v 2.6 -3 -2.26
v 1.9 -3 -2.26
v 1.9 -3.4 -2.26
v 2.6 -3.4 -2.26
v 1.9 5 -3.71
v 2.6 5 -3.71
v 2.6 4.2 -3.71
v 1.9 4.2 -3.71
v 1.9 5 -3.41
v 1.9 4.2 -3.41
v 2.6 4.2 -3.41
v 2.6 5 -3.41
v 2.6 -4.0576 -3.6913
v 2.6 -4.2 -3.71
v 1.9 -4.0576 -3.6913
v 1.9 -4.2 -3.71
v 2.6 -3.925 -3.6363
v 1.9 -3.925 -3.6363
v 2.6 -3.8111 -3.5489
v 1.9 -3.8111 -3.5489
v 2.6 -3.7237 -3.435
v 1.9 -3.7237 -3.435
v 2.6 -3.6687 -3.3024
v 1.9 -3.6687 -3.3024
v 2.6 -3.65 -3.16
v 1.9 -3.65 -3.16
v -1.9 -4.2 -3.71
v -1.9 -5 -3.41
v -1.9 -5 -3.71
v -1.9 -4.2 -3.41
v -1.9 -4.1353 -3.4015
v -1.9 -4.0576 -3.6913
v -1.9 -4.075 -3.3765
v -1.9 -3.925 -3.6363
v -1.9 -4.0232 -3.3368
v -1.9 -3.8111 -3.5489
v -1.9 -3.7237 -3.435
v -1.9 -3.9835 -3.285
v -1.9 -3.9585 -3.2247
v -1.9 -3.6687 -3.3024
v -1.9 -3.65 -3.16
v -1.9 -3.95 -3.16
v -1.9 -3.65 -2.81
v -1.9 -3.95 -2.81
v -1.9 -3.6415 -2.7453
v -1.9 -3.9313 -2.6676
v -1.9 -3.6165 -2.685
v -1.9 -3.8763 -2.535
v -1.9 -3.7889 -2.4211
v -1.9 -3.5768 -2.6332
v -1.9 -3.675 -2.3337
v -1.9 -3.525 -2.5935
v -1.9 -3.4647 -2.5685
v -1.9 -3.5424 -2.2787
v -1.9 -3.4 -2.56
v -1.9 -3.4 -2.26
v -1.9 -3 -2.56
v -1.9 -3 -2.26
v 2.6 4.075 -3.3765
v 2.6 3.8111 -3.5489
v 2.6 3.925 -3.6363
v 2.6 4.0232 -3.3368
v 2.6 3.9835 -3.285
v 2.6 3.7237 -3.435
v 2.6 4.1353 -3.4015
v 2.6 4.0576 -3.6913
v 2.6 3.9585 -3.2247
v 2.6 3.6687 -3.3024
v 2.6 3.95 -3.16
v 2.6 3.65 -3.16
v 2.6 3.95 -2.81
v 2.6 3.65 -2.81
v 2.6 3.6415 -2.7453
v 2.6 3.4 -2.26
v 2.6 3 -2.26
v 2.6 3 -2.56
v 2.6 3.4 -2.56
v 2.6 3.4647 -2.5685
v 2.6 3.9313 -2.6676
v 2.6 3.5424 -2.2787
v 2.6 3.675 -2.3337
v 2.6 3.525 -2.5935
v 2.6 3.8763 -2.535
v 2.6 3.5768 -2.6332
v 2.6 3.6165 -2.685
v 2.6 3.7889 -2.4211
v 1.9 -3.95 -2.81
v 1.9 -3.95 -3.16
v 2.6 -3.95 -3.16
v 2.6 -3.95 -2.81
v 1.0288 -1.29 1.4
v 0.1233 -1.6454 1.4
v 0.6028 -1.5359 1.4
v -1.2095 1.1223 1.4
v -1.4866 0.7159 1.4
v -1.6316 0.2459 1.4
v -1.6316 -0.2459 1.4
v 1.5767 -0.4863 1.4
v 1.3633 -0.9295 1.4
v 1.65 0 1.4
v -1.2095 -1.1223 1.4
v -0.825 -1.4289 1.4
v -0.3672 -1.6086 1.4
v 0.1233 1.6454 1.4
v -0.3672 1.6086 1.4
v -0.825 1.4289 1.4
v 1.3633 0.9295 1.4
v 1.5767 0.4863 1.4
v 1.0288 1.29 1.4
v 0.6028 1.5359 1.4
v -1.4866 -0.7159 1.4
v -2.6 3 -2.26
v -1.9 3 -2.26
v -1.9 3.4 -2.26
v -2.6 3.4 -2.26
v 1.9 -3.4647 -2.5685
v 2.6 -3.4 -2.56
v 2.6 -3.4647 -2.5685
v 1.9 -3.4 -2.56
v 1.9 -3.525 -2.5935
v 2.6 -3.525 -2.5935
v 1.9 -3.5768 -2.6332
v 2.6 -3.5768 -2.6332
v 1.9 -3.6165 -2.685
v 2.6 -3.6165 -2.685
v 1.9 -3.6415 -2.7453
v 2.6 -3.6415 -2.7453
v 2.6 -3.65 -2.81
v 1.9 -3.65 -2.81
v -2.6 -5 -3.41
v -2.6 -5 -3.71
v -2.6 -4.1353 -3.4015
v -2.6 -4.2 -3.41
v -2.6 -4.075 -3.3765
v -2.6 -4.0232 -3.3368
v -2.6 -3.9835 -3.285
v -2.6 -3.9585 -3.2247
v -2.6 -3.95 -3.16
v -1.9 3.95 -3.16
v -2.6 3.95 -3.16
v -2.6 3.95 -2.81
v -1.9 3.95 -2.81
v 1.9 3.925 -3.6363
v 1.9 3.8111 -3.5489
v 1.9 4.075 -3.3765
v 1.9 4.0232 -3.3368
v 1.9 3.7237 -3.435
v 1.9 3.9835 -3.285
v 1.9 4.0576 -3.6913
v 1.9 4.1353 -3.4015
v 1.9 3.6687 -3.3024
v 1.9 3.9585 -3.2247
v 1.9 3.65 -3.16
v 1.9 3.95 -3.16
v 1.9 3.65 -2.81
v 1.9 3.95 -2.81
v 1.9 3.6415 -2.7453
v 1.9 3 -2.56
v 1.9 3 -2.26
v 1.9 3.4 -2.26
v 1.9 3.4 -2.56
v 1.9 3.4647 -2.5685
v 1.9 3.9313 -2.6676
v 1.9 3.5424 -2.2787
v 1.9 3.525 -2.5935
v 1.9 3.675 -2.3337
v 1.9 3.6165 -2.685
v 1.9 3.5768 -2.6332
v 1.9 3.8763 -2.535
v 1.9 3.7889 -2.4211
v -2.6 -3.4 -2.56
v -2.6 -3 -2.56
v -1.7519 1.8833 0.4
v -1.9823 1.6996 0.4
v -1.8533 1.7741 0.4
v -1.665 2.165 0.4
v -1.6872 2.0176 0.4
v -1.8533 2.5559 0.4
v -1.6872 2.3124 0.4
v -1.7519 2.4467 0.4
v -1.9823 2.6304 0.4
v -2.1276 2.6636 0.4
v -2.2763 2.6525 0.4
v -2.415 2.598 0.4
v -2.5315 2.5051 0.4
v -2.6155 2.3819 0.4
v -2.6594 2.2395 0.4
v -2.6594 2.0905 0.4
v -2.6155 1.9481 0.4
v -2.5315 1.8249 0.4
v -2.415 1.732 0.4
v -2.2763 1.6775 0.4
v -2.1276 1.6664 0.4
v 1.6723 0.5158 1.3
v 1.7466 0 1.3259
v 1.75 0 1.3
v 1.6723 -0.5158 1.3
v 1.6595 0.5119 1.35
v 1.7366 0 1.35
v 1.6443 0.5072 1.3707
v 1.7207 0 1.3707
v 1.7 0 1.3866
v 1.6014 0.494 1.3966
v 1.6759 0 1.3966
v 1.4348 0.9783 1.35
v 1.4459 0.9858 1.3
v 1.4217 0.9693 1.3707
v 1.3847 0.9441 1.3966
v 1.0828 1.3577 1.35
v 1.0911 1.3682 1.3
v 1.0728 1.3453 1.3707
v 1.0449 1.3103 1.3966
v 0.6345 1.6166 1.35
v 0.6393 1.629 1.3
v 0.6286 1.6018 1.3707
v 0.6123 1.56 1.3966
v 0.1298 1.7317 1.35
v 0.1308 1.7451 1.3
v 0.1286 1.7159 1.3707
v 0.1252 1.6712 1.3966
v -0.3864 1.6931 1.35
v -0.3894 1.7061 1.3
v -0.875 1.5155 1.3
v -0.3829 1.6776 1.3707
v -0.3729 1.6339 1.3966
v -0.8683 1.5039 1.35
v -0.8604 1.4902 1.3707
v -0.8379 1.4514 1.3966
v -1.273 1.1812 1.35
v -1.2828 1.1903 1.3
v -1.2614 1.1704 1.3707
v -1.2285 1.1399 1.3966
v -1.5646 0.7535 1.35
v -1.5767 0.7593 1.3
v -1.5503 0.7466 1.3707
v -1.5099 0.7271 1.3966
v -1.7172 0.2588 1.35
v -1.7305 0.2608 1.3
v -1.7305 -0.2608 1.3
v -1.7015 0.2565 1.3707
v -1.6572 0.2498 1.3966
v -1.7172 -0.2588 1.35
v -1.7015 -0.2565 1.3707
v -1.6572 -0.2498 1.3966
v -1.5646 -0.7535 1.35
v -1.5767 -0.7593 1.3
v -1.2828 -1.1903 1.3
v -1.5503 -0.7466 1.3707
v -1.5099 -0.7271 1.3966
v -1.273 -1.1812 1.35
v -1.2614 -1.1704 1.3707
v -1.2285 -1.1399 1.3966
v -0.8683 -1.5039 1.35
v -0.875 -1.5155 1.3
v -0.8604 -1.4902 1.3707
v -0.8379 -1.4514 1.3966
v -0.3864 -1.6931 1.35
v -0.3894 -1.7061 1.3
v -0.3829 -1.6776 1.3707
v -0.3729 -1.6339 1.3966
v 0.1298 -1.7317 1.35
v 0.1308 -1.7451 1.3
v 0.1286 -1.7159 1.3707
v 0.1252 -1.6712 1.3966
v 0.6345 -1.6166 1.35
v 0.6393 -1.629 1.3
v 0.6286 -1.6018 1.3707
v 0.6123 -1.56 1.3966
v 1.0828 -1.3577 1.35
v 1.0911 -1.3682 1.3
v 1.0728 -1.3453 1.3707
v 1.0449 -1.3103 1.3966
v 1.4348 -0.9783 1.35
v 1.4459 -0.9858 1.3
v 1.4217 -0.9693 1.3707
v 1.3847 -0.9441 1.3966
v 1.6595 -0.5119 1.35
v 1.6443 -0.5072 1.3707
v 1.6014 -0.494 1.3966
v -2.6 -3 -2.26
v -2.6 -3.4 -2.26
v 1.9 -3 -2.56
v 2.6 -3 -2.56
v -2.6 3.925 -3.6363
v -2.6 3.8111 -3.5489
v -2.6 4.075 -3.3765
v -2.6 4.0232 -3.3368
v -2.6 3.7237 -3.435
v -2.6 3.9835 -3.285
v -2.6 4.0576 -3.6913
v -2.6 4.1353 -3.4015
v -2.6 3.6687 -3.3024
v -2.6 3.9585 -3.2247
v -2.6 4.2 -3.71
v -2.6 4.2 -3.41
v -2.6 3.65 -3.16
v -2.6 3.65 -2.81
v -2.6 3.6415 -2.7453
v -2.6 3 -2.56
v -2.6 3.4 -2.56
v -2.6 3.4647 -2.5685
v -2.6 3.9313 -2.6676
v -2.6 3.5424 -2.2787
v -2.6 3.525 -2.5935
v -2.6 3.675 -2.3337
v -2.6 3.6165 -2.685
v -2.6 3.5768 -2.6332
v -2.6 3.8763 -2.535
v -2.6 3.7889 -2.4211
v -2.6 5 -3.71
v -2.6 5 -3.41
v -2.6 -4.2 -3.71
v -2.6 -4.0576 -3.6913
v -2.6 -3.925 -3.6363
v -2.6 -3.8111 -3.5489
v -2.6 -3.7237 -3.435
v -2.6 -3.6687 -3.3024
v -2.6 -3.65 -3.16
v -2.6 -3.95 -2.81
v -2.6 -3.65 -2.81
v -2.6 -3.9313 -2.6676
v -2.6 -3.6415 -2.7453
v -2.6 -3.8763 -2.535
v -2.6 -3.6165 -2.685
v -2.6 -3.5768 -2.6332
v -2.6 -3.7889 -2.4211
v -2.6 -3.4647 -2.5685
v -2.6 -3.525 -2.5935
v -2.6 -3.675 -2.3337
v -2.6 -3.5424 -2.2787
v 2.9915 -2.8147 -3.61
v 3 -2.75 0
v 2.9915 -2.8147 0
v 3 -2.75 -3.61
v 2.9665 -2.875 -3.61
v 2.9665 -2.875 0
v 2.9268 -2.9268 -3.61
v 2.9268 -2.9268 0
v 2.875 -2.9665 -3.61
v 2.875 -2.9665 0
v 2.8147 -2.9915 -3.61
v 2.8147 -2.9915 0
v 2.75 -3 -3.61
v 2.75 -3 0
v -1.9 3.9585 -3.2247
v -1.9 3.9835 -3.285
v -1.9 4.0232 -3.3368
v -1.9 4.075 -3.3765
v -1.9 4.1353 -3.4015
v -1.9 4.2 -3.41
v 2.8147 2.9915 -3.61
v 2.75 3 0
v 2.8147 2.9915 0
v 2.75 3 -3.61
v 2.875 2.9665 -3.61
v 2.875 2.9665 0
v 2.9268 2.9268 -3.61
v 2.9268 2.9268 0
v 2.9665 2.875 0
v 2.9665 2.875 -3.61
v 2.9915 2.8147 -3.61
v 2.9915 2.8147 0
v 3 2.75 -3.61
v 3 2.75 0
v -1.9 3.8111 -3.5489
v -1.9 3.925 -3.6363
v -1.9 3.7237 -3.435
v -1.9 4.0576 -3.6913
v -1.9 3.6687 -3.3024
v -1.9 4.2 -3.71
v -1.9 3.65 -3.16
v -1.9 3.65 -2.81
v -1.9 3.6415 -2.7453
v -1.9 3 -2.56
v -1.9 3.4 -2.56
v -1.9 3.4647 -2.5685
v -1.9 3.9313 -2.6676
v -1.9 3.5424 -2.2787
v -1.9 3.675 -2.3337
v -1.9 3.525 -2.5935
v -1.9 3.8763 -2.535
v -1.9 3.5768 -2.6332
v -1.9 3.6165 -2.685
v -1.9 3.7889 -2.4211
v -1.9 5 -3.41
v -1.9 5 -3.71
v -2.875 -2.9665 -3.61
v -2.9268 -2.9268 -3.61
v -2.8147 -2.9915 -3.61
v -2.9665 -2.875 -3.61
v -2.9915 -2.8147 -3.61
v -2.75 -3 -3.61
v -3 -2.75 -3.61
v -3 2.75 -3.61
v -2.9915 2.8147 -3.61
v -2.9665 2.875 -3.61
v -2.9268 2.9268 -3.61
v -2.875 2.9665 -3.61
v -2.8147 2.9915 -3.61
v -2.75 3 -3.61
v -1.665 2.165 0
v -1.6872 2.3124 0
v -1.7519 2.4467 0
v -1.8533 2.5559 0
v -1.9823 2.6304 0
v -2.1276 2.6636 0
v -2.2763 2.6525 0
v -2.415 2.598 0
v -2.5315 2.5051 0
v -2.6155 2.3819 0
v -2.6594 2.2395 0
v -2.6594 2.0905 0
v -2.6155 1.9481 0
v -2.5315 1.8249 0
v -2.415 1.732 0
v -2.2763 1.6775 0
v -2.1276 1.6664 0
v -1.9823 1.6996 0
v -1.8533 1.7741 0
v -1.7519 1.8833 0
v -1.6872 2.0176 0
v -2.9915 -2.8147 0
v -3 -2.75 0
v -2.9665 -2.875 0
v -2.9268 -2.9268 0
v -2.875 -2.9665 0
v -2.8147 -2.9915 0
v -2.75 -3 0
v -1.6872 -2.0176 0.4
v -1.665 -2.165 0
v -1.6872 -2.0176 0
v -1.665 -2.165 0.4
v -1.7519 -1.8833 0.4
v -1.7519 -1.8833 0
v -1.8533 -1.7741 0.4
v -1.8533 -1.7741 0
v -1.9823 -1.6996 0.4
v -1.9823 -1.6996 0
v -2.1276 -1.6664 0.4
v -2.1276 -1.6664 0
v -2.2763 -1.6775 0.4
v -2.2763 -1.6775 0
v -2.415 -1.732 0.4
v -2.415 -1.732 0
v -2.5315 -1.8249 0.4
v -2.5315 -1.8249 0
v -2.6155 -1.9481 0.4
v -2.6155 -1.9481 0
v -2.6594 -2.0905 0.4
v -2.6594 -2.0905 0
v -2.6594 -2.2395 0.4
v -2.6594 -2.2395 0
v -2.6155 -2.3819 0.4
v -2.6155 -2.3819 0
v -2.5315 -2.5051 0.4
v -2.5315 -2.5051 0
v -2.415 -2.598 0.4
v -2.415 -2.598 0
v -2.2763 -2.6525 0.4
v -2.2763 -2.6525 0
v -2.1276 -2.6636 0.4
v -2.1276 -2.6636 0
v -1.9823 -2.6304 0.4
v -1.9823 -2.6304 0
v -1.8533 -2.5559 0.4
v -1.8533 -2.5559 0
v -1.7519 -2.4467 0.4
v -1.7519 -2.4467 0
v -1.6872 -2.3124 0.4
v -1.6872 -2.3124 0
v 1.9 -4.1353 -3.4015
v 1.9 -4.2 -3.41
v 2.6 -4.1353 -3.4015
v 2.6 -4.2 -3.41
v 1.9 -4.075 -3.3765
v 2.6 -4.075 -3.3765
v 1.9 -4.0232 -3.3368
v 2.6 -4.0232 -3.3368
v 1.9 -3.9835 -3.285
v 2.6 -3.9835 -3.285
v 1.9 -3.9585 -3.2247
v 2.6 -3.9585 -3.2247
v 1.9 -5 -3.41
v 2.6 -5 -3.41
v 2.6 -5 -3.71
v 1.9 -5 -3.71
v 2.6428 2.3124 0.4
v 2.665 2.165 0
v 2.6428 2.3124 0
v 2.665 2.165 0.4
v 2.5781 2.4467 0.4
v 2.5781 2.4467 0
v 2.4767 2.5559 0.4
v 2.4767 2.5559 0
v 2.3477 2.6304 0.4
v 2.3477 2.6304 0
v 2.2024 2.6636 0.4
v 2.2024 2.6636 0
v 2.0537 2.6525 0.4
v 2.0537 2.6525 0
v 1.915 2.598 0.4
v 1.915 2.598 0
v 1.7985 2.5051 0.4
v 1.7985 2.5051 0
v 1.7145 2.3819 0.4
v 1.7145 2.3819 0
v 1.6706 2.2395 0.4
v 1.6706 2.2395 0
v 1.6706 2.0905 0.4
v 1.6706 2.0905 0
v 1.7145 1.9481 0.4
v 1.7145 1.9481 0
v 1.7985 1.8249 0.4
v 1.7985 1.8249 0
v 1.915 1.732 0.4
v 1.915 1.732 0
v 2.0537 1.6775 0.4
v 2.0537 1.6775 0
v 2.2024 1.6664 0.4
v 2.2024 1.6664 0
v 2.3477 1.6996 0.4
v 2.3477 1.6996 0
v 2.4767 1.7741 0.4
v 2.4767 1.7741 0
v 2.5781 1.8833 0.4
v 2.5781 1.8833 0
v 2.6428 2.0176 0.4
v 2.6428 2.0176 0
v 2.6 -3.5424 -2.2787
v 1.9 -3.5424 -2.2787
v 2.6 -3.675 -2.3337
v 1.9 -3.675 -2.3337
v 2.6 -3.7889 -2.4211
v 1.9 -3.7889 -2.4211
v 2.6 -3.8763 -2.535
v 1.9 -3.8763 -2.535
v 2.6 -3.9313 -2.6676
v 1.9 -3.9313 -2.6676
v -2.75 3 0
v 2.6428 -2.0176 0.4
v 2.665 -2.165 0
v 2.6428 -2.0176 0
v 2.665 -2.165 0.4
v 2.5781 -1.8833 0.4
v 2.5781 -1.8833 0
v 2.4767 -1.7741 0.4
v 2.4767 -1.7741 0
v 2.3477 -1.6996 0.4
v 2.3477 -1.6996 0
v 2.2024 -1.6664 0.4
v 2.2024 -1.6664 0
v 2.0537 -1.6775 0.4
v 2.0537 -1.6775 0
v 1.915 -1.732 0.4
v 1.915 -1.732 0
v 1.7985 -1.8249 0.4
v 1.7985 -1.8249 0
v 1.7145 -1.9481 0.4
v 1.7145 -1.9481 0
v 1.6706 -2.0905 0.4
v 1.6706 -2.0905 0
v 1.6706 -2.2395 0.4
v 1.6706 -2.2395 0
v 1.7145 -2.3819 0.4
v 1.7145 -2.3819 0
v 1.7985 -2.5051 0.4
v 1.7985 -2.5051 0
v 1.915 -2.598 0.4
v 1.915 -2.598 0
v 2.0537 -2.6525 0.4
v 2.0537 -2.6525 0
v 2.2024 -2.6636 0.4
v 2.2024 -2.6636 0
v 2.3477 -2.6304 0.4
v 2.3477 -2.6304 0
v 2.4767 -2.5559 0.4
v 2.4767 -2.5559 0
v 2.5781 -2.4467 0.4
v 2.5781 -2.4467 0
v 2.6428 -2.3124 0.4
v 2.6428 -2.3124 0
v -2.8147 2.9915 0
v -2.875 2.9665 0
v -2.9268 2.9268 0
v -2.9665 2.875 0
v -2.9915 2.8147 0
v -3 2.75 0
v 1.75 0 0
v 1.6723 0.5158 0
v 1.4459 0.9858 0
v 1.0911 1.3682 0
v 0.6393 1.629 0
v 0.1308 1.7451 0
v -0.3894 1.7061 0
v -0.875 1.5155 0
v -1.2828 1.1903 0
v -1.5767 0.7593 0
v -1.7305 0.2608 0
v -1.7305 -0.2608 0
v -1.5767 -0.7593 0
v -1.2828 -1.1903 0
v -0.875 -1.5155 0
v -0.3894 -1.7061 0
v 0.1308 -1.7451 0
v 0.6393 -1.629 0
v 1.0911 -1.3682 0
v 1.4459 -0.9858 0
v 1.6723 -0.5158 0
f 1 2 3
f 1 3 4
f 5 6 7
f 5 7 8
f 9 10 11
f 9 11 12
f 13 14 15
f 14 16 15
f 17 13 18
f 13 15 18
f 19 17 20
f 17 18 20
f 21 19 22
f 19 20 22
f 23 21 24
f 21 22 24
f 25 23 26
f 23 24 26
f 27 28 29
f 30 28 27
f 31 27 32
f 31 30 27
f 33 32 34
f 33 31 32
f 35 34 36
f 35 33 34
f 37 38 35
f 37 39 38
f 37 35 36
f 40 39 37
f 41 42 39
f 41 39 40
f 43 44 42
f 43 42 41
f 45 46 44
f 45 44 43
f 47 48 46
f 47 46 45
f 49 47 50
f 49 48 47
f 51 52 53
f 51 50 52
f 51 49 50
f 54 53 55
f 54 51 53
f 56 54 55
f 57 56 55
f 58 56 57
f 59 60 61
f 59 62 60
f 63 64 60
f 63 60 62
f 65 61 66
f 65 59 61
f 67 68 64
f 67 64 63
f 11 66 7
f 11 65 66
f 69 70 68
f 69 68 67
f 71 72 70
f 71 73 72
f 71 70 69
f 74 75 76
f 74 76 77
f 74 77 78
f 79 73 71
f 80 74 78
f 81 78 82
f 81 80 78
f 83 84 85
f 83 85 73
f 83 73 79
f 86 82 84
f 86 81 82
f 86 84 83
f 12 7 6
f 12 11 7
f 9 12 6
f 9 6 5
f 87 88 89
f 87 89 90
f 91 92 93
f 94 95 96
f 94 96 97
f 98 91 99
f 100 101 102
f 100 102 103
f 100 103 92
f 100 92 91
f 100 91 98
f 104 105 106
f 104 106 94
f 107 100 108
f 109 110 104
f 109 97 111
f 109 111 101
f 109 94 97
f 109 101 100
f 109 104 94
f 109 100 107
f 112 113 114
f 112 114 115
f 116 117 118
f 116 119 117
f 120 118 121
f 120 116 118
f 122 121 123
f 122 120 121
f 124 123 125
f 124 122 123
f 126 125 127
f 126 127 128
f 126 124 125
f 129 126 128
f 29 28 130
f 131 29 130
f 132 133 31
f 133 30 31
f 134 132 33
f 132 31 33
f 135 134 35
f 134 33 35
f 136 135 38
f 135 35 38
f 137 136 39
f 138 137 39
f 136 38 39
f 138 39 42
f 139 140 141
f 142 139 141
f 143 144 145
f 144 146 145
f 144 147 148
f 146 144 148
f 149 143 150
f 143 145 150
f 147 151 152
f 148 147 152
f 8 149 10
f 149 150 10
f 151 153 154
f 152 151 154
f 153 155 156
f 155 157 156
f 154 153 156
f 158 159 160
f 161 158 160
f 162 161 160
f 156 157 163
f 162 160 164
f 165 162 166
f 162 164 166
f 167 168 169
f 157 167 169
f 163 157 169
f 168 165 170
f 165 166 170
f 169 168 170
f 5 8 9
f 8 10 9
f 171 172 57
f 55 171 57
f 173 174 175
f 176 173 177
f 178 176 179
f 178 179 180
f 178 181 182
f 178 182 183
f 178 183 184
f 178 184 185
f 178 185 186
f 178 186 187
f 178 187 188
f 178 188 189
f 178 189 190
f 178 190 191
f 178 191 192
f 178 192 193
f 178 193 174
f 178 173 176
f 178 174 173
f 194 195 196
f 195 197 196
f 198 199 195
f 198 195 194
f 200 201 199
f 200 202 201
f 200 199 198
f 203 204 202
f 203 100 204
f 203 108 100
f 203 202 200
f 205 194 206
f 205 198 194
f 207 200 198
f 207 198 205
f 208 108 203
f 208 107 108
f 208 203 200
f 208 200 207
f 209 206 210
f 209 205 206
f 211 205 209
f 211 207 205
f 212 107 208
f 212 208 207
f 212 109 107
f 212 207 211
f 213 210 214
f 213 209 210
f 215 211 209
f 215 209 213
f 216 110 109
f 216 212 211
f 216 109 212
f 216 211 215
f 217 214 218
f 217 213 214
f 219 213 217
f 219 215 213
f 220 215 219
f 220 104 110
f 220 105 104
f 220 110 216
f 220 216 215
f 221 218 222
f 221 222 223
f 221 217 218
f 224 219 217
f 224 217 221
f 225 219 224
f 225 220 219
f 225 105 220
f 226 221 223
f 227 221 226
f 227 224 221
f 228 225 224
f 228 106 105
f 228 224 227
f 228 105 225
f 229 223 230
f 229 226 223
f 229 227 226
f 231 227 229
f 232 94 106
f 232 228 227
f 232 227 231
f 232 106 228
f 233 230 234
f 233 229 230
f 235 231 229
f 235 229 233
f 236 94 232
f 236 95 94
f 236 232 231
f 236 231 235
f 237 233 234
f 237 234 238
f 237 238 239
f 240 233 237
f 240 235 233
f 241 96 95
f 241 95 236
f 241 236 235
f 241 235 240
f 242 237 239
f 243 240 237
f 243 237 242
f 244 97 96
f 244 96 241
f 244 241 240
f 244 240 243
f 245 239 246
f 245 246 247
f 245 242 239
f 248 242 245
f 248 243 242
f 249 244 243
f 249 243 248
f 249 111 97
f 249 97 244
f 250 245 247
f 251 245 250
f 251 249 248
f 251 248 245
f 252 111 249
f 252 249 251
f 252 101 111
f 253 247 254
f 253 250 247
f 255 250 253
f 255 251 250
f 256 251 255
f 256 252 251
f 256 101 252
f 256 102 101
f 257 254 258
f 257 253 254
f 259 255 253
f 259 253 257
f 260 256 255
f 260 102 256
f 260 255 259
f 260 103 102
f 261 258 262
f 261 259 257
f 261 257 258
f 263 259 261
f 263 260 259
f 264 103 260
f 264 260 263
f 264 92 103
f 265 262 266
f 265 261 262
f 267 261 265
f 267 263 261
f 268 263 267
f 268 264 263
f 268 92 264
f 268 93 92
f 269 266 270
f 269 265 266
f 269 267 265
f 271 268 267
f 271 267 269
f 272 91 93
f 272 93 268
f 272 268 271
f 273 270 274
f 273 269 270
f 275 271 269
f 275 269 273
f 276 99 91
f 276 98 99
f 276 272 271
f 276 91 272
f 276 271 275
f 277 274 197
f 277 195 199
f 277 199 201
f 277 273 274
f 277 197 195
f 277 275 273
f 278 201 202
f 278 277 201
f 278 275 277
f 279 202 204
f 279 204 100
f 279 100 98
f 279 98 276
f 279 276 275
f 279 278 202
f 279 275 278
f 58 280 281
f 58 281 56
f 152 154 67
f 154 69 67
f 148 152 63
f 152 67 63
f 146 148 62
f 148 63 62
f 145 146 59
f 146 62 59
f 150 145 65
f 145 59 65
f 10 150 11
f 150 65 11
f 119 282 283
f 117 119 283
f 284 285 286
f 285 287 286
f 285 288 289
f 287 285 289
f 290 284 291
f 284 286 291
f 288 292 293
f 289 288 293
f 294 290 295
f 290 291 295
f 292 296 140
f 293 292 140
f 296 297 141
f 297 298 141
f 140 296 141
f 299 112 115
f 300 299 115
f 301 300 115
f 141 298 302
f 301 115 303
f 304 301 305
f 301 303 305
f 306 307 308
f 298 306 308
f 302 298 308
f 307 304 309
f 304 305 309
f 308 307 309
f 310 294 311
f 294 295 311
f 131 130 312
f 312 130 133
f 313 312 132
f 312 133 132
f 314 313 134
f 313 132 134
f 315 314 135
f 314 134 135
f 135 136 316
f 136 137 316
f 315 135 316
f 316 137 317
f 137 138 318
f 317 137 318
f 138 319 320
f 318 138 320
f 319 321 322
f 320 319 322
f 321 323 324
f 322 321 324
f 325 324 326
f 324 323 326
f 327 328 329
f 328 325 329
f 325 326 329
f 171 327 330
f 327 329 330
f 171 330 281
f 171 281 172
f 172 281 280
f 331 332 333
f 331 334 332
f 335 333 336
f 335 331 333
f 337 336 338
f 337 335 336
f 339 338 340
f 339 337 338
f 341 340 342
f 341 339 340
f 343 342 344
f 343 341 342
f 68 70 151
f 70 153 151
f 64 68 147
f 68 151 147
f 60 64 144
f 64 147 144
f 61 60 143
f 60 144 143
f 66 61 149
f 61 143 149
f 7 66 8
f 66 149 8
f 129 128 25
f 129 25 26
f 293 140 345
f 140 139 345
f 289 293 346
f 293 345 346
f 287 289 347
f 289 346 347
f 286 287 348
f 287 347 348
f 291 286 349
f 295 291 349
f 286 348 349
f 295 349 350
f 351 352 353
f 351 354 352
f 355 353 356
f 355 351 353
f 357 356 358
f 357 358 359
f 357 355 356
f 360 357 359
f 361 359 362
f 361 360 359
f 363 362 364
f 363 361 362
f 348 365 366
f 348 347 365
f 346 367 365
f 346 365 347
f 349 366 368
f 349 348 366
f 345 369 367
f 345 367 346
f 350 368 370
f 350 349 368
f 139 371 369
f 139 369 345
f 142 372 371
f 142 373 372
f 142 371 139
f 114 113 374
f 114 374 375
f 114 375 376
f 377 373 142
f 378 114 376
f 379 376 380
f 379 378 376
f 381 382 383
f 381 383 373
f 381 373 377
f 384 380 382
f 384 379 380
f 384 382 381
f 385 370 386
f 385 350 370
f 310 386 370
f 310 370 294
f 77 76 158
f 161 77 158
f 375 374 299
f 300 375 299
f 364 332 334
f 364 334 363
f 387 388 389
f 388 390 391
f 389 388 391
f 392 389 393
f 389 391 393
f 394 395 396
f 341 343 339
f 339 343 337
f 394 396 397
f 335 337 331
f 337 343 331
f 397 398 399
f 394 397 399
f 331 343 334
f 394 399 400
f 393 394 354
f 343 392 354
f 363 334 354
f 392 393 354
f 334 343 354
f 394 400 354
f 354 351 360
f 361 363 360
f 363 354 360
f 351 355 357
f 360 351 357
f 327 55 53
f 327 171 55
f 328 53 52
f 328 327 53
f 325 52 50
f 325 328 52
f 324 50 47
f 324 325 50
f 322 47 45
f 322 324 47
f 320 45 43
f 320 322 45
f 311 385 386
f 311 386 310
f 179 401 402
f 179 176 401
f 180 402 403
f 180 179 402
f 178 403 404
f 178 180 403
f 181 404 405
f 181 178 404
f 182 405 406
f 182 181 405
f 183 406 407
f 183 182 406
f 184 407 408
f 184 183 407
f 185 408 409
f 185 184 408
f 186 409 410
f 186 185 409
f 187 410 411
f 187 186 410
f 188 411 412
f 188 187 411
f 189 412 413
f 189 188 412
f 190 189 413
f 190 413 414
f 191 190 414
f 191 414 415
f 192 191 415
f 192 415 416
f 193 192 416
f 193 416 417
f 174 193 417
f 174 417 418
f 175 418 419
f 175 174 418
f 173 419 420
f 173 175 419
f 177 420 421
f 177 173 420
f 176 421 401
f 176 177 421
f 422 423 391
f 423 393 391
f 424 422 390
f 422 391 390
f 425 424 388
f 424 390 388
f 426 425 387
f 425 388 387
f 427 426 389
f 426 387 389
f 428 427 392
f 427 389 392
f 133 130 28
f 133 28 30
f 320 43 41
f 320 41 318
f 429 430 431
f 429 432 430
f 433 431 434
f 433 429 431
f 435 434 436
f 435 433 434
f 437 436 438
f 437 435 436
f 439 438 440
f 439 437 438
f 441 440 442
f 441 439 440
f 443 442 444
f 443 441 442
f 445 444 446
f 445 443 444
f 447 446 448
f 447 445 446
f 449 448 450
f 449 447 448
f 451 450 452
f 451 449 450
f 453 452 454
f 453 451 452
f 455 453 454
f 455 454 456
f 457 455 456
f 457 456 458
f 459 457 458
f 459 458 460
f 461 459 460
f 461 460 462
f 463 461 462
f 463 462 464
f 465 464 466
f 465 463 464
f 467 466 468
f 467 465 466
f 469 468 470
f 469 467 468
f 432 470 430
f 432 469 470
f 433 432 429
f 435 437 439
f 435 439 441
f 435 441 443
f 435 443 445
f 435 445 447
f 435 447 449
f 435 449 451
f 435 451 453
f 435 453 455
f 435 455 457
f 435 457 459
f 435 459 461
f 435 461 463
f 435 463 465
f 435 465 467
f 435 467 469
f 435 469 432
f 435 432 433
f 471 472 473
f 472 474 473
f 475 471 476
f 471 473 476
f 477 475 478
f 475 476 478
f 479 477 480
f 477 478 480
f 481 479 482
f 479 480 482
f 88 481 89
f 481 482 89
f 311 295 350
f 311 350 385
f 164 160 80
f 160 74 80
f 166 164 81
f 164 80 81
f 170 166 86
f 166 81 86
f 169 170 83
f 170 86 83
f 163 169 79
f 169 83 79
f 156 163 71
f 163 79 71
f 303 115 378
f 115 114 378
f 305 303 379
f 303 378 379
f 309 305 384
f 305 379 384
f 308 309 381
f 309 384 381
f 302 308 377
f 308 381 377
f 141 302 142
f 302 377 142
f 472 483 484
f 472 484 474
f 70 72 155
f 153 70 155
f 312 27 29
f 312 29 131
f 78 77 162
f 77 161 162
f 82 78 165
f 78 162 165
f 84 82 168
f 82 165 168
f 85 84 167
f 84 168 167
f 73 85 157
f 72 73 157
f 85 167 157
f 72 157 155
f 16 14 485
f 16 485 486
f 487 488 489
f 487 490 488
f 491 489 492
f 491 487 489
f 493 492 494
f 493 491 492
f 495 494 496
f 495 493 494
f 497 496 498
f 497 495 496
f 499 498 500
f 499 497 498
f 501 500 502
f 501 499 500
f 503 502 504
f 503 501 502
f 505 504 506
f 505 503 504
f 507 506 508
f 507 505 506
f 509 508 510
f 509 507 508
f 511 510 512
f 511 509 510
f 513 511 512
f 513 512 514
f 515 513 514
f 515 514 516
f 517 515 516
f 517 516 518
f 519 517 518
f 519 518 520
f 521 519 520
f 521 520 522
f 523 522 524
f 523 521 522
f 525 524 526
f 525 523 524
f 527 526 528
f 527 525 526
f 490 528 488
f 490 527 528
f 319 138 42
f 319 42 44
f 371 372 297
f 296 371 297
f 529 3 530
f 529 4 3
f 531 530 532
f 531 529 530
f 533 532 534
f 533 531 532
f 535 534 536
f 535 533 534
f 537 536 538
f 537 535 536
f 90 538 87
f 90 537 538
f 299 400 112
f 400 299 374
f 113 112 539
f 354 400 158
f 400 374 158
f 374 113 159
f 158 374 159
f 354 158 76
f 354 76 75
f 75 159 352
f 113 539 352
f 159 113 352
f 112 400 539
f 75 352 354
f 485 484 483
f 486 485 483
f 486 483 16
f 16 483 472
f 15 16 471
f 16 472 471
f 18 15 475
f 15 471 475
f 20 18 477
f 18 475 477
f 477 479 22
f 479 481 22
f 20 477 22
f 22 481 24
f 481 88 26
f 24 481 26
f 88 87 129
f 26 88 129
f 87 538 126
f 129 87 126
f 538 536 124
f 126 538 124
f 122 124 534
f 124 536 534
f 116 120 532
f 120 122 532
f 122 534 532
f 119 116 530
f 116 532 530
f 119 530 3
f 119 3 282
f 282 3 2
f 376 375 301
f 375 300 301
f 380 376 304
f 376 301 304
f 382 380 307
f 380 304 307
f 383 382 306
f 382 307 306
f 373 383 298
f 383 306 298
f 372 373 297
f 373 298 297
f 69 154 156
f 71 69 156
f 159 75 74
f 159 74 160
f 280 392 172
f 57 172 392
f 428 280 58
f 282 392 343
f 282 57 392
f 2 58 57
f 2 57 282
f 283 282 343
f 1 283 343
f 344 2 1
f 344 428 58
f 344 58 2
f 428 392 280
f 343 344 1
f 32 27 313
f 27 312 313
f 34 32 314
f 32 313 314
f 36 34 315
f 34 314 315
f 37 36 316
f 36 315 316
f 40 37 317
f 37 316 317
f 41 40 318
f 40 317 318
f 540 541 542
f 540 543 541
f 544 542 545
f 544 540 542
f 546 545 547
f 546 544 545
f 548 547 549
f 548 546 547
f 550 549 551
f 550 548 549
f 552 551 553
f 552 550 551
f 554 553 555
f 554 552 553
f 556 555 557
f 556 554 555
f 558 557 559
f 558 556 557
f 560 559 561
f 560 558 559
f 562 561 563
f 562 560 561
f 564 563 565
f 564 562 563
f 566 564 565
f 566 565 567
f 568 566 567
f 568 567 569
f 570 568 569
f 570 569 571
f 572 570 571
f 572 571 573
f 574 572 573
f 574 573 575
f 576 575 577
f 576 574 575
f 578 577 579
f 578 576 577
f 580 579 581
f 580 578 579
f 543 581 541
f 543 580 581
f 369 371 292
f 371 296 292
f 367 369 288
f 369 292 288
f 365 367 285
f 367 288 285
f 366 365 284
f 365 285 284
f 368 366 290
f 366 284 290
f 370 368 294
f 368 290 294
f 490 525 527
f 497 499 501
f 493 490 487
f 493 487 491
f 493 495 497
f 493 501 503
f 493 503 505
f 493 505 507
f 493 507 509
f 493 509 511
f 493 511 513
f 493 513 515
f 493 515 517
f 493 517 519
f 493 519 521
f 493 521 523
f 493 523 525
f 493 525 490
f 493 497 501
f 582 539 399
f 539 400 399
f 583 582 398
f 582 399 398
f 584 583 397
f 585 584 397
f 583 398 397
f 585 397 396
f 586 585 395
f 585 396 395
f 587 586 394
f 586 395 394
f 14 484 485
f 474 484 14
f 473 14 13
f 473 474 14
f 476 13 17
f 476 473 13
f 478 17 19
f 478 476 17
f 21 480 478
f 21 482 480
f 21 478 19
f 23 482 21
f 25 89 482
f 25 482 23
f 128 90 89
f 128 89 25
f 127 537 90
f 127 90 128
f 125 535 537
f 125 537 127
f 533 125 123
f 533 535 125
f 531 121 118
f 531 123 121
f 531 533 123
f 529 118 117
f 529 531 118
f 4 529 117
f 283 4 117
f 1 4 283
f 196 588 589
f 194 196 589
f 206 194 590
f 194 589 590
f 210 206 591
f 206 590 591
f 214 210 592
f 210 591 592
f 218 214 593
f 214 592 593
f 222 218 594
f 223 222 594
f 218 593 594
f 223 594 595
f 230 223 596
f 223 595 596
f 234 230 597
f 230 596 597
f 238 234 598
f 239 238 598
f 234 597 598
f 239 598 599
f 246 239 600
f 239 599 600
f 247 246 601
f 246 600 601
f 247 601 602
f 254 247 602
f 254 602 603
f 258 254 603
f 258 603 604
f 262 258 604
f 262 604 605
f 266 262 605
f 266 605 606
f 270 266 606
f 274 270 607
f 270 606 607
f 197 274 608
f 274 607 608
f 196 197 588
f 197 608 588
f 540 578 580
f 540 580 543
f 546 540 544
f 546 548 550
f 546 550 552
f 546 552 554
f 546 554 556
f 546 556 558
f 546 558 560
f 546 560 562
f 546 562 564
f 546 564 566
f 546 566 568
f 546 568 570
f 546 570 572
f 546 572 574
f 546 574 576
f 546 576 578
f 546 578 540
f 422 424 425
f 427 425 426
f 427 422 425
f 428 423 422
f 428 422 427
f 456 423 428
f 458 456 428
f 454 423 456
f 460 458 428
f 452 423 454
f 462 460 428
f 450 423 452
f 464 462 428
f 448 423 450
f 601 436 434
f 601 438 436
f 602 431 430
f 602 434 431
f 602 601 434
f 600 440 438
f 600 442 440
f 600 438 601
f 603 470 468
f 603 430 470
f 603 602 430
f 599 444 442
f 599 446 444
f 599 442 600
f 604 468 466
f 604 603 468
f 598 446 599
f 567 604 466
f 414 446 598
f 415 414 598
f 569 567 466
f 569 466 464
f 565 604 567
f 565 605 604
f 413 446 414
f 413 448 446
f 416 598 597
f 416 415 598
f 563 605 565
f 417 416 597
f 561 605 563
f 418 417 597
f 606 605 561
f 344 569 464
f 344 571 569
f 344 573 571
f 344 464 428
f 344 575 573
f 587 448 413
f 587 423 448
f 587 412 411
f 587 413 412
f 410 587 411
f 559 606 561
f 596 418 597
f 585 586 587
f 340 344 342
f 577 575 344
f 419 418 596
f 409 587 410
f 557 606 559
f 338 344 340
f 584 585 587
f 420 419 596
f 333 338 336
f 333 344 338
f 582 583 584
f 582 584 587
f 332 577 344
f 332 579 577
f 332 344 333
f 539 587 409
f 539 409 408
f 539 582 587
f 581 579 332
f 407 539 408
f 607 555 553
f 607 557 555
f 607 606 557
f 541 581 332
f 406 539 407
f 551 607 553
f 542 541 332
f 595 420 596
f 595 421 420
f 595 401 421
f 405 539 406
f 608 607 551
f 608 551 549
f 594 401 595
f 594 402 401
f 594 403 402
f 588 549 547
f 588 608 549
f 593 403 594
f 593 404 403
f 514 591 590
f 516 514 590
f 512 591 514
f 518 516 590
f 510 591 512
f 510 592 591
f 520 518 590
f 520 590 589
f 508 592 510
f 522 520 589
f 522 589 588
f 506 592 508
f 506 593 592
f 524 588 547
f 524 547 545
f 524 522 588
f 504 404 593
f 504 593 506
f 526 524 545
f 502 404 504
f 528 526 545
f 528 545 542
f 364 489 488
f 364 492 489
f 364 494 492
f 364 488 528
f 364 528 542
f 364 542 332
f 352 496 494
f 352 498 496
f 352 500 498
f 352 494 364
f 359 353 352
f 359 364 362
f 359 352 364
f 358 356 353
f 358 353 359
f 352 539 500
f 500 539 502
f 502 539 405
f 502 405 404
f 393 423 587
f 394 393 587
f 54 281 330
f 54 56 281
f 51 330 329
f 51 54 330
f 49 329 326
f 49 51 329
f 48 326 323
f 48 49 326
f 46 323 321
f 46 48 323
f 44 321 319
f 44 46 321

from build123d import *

# Parameters (mm, degrees)
SKETCH1_W            = 6
SKETCH1_H            = 6
BOSS_EXTRUDE1_DEPTH  = 3.61
SKETCH2_W            = 0.7
SKETCH2_H            = 0.3
BOSS_EXTRUDE2_DEPTH  = 2
SKETCH3_W            = 0.7
SKETCH3_H            = 1.35
BOSS_EXTRUDE3_DEPTH  = 1.15
SKETCH4_W            = 0.7
SKETCH4_H            = 0.3
BOSS_EXTRUDE4_DEPTH  = 2
SKETCH5_W            = 0.7
SKETCH5_H            = 1.35
BOSS_EXTRUDE5_DEPTH  = 1.15
SKETCH6_W            = 0.7
SKETCH6_H            = 0.3
BOSS_EXTRUDE6_DEPTH  = 2
SKETCH7_W            = 0.7
SKETCH7_H            = 1.35
BOSS_EXTRUDE7_DEPTH  = 1.15
SKETCH8_W            = 0.7
SKETCH8_H            = 0.3
BOSS_EXTRUDE8_DEPTH  = 2
SKETCH9_W            = 0.7
SKETCH9_H            = 1.35
BOSS_EXTRUDE9_DEPTH  = 1.15
CUT_EXTRUDE1_REACH   = 10.374
SKETCH10_W           = 1.15
SKETCH10_H           = 1.05
SKETCH11_W           = 1.15
SKETCH11_H           = 1.05
CUT_EXTRUDE2_DEPTH   = 8.923010791
CUT_EXTRUDE3_REACH   = 10.374
SKETCH12_W           = 1.15
SKETCH12_H           = 1.05
SKETCH13_W           = 1.15
SKETCH13_H           = 1.05
CUT_EXTRUDE4_DEPTH   = 8.923010791
SKETCH14_W           = 0.5
SKETCH14_H           = 0.4
SKETCH15_W           = 0.5
SKETCH15_H           = 0.4
SKETCH16_W           = 0.5
SKETCH16_H           = 0.4
SKETCH17_W           = 0.5
SKETCH17_H           = 0.4
FILLET1_R            = 0.25
FILLET2_R            = 0.55
SKETCH19_R           = 1.75
BOSS_EXTRUDE10_DEPTH = 1.4
FILLET4_R            = 0.1


with BuildPart() as part:
    # Sketch1 → Boss-Extrude1 (new body)
    with BuildSketch(Plane.XY):
        Rectangle(SKETCH1_W, SKETCH1_H)
    extrude(amount=-BOSS_EXTRUDE1_DEPTH)

    # Sketch2 → Boss-Extrude2 (add)
    with BuildSketch(Plane.XZ.offset(3)):
        with Locations((-2.25, -2.41)):
            Rectangle(SKETCH2_W, SKETCH2_H)
    extrude(amount=BOSS_EXTRUDE2_DEPTH)

    # Sketch3 → Boss-Extrude3 (add)
    with BuildSketch(Plane(origin=(0, 0, -2.56), x_dir=(-1, 0, 0), z_dir=(0, 0, -1))):
        with Locations((2.25, -4.325)):
            Rectangle(SKETCH3_W, SKETCH3_H)
    extrude(amount=BOSS_EXTRUDE3_DEPTH)

    # Sketch4 → Boss-Extrude4 (add)
    with BuildSketch(Plane.XZ.offset(3)):
        with Locations((2.25, -2.41)):
            Rectangle(SKETCH4_W, SKETCH4_H)
    extrude(amount=BOSS_EXTRUDE4_DEPTH)

    # Sketch5 → Boss-Extrude5 (add)
    with BuildSketch(Plane(origin=(0, 0, -2.56), x_dir=(-1, 0, 0), z_dir=(0, 0, -1))):
        with Locations((-2.25, -4.325)):
            Rectangle(SKETCH5_W, SKETCH5_H)
    extrude(amount=BOSS_EXTRUDE5_DEPTH)

    # Sketch6 → Boss-Extrude6 (add)
    with BuildSketch(Plane(origin=(0, 3, 0), x_dir=(-1, 0, 0), z_dir=(0, 1, 0))):
        with Locations((2.25, -2.41)):
            Rectangle(SKETCH6_W, SKETCH6_H)
    extrude(amount=BOSS_EXTRUDE6_DEPTH)

    # Sketch7 → Boss-Extrude7 (add)
    with BuildSketch(Plane(origin=(0, 0, -2.56), x_dir=(-1, 0, 0), z_dir=(0, 0, -1))):
        with Locations((2.25, 4.325)):
            Rectangle(SKETCH7_W, SKETCH7_H)
    extrude(amount=BOSS_EXTRUDE7_DEPTH)

    # Sketch8 → Boss-Extrude8 (add)
    with BuildSketch(Plane(origin=(0, 3, 0), x_dir=(-1, 0, 0), z_dir=(0, 1, 0))):
        with Locations((-2.25, -2.41)):
            Rectangle(SKETCH8_W, SKETCH8_H)
    extrude(amount=BOSS_EXTRUDE8_DEPTH)

    # Sketch9 → Boss-Extrude9 (add)
    with BuildSketch(Plane(origin=(0, 0, -2.56), x_dir=(-1, 0, 0), z_dir=(0, 0, -1))):
        with Locations((-2.25, 4.325)):
            Rectangle(SKETCH9_W, SKETCH9_H)
    extrude(amount=BOSS_EXTRUDE9_DEPTH)

    # Sketch10 → Cut-Extrude1 (cut, up to next)
    with BuildSketch(Plane.ZY.offset(2.6), mode=Mode.PRIVATE) as cut_extrude1_sk1:
        with Locations((-2.835, -4.475)):
            Rectangle(SKETCH10_W, SKETCH10_H)
    cut_extrude1_tool1 = extrude(cut_extrude1_sk1.sketch, amount=-CUT_EXTRUDE1_REACH, mode=Mode.PRIVATE) & part.part
    add(cut_extrude1_tool1.solids().sort_by_distance((-2.6, -4.475, -2.835))[0], mode=Mode.SUBTRACT)

    # Sketch11 → Cut-Extrude2 (cut, through all)
    with BuildSketch(Plane.ZY.offset(-1.9)):
        with Locations((-2.835, -4.475)):
            Rectangle(SKETCH11_W, SKETCH11_H)
    extrude(amount=-CUT_EXTRUDE2_DEPTH, mode=Mode.SUBTRACT)

    # Sketch12 → Cut-Extrude3 (cut, up to next)
    with BuildSketch(Plane.ZY.offset(2.6), mode=Mode.PRIVATE) as cut_extrude3_sk1:
        with Locations((-2.835, 4.475)):
            Rectangle(SKETCH12_W, SKETCH12_H)
    cut_extrude3_tool1 = extrude(cut_extrude3_sk1.sketch, amount=-CUT_EXTRUDE3_REACH, mode=Mode.PRIVATE) & part.part
    add(cut_extrude3_tool1.solids().sort_by_distance((-2.6, 4.475, -2.835))[0], mode=Mode.SUBTRACT)

    # Sketch13 → Cut-Extrude4 (cut, through all)
    with BuildSketch(Plane.ZY.offset(-1.9)):
        with Locations((-2.835, 4.475)):
            Rectangle(SKETCH13_W, SKETCH13_H)
    extrude(amount=-CUT_EXTRUDE4_DEPTH, mode=Mode.SUBTRACT)

    # Sketch14 → Revolve1 (revolve)
    with BuildSketch(Plane(origin=(0, -2.165, 0), x_dir=(-1, 0, 0), z_dir=(0, 1, 0))):
        with Locations((-2.415, 0.2)):
            Rectangle(SKETCH14_W, SKETCH14_H)
    revolve(axis=Axis((2.165, -2.165, 0), (0, 0, 1)))

    # Sketch15 → Revolve2 (revolve)
    with BuildSketch(Plane(origin=(0, -2.165, 0), x_dir=(-1, 0, 0), z_dir=(0, 1, 0))):
        with Locations((1.915, 0.2)):
            Rectangle(SKETCH15_W, SKETCH15_H)
    revolve(axis=Axis((-2.165, -2.165, 0), (0, 0, 1)))

    # Sketch16 → Revolve3 (revolve)
    with BuildSketch(Plane(origin=(0, 2.165, 0), x_dir=(-1, 0, 0), z_dir=(0, 1, 0))):
        with Locations((1.915, 0.2)):
            Rectangle(SKETCH16_W, SKETCH16_H)
    revolve(axis=Axis((-2.165, 2.165, 0), (0, 0, 1)))

    # Sketch17 → Revolve4 (revolve)
    with BuildSketch(Plane(origin=(0, 2.165, 0), x_dir=(-1, 0, 0), z_dir=(0, 1, 0))):
        with Locations((-2.415, 0.2)):
            Rectangle(SKETCH17_W, SKETCH17_H)
    revolve(axis=Axis((2.165, 2.165, 0), (0, 0, 1)))

    # Fillet1
    fillet1_edges = [part.edges().sort_by_distance(p)[0] for p in [
        (2.25, 3.65, -2.56),
        (-2.25, -3.95, -3.41),
        (2.25, -3.95, -3.41),
        (-2.25, 3.95, -3.41),
        (2.25, 3.95, -3.41),
        (-2.25, -3.65, -2.56),
        (2.25, -3.65, -2.56),
        (-3, -3, -1.805),
        (-3, 3, -1.805),
        (3, 3, -1.805),
        (3, -3, -1.805),
        (-2.25, 3.65, -2.56),
    ]]
    fillet(fillet1_edges, radius=FILLET1_R)

    # Fillet2
    fillet2_edges = [part.edges().sort_by_distance(p)[0] for p in [
        (2.25, 3.65, -3.71),
        (-2.25, -3.95, -2.26),
        (2.25, -3.95, -2.26),
        (-2.25, 3.95, -2.26),
        (2.25, 3.95, -2.26),
        (-2.25, -3.65, -3.71),
        (2.25, -3.65, -3.71),
        (-2.25, 3.65, -3.71),
    ]]
    fillet(fillet2_edges, radius=FILLET2_R)

    # Sketch19 → Boss-Extrude10 (add)
    with BuildSketch(Plane.XY):
        Circle(SKETCH19_R)
    extrude(amount=BOSS_EXTRUDE10_DEPTH)

    # Fillet4
    fillet4_edges = [part.edges().sort_by_distance(p)[0] for p in [
        (-1.75, 0, 1.4),
    ]]
    fillet(fillet4_edges, radius=FILLET4_R)


solid = part.part
